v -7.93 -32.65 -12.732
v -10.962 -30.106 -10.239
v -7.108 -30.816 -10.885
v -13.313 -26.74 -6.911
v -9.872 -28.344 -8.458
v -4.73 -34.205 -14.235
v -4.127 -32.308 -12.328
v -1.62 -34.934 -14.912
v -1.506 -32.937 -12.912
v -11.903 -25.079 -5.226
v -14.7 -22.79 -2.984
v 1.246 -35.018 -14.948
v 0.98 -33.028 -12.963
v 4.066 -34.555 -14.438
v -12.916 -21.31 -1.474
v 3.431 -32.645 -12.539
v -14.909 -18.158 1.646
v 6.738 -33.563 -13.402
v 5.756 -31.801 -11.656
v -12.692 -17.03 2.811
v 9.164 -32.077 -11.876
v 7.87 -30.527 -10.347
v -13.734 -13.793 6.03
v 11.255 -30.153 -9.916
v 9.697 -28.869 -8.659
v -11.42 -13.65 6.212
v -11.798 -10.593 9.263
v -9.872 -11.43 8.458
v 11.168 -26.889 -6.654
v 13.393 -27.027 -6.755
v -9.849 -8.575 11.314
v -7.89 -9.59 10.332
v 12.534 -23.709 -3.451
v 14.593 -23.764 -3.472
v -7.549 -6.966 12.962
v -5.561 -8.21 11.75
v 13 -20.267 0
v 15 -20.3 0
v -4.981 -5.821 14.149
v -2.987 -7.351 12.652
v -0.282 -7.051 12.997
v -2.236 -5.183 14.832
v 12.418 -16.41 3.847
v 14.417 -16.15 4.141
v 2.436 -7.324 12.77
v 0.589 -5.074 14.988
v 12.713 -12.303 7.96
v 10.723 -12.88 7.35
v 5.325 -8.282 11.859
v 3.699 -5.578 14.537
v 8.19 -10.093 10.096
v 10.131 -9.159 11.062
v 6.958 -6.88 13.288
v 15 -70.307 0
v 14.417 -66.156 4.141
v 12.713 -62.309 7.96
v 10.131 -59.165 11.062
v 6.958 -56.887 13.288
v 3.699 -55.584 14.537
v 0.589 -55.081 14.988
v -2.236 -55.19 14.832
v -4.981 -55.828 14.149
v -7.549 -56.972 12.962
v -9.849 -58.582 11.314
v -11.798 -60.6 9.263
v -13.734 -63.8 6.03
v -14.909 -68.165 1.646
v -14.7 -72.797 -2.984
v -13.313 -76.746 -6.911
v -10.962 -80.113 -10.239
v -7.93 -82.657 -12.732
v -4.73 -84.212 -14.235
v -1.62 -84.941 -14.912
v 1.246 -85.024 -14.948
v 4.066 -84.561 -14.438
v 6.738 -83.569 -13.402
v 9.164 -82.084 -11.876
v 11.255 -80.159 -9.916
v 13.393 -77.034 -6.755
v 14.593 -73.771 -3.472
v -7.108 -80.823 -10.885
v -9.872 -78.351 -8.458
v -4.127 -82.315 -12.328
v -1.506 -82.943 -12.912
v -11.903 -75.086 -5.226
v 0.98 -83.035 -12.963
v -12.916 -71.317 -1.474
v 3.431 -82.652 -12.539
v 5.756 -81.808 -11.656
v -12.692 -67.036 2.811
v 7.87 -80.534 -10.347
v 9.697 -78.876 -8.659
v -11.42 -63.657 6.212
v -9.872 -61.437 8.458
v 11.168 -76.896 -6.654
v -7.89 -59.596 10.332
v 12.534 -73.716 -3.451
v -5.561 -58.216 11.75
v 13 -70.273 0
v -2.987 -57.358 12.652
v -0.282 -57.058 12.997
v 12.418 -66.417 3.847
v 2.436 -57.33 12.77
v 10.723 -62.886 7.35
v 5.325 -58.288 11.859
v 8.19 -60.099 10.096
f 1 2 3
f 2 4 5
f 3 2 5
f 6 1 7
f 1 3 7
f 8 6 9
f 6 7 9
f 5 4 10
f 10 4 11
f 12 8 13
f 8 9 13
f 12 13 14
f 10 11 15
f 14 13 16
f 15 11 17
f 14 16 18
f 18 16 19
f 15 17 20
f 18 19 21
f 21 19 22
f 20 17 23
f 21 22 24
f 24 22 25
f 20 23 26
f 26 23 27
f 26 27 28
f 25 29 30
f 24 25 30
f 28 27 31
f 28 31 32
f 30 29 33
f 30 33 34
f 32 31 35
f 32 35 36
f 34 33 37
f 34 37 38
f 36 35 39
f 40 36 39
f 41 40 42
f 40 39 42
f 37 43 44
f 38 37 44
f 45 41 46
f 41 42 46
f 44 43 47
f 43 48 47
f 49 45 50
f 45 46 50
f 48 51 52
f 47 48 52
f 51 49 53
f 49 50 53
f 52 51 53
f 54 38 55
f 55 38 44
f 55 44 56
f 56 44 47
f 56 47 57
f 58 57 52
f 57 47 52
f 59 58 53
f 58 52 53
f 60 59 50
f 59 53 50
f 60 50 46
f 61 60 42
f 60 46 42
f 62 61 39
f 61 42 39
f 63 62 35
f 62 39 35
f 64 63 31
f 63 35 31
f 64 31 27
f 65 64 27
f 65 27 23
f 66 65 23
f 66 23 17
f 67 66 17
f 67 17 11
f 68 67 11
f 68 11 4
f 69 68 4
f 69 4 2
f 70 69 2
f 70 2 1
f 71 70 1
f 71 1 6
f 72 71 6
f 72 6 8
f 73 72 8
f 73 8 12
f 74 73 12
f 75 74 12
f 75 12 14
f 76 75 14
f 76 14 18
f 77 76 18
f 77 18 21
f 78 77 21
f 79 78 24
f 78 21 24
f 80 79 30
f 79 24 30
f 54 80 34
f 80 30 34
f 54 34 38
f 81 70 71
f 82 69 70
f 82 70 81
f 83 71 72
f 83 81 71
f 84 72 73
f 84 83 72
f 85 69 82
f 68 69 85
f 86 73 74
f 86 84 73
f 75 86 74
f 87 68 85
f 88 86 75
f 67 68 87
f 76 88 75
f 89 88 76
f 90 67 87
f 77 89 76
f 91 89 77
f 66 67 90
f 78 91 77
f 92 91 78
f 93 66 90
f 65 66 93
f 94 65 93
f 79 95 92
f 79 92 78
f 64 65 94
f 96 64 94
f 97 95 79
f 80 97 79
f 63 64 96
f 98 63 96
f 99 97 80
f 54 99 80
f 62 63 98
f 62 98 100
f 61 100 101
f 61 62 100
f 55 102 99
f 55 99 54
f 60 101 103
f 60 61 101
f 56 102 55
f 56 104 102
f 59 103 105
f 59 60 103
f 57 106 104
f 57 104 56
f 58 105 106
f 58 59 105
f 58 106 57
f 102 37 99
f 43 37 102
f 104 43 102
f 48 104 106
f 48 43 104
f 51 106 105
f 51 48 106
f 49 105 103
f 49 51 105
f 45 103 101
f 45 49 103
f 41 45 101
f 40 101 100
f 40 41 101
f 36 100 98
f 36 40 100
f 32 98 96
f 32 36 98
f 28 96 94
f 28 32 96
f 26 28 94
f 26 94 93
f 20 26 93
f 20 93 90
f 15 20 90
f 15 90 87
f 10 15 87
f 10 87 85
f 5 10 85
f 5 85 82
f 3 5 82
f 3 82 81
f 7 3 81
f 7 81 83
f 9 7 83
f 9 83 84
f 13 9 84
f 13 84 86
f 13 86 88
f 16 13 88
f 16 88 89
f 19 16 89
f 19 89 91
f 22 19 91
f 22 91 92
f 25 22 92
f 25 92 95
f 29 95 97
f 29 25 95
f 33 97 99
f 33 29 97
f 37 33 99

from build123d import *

# Parameters (mm, degrees)
F0_R     = 15
F0_R_2   = 13
F1_DEPTH = 100
F5_W     = 78.4293748438
F5_H     = 68.3440808207
F6_DEPTH = 25
F8_W     = 147.4837362766
F8_H     = 68.2909283787
F9_DEPTH = 35


with BuildPart() as f1:
    # F0 (on Front) → F1 (new body)
    with BuildSketch(Plane.XZ):
        Circle(F0_R)
        Circle(F0_R_2, mode=Mode.SUBTRACT)
    extrude(amount=F1_DEPTH)

    # F5 (on offset) → F6 (cut)
    with BuildSketch(Plane(origin=(-0.1664731949, -10.0254920816, 10.0241098435), x_dir=(0.9999310662, -0.0083030673, 0.0083019226), z_dir=(-0.011741501, -0.7071067812, 0.7070092907))):
        with Locations((-2.7506519109, -14.8982955143)):
            Rectangle(F5_W, F5_H)
    extrude(amount=-F6_DEPTH, mode=Mode.SUBTRACT)

    # F8 (on offset) → F9 (cut)
    with BuildSketch(Plane(origin=(-0.5816526691, -35.0287878644, 35.0239583631), x_dir=(0.9999310662, -0.0083030673, 0.0083019226), z_dir=(-0.011741501, -0.7071067812, 0.7070092907))):
        with Locations((9.9375471473, -57.1080548689)):
            Rectangle(F8_W, F8_H)
    extrude(amount=F9_DEPTH, mode=Mode.SUBTRACT)


solid = f1.part
